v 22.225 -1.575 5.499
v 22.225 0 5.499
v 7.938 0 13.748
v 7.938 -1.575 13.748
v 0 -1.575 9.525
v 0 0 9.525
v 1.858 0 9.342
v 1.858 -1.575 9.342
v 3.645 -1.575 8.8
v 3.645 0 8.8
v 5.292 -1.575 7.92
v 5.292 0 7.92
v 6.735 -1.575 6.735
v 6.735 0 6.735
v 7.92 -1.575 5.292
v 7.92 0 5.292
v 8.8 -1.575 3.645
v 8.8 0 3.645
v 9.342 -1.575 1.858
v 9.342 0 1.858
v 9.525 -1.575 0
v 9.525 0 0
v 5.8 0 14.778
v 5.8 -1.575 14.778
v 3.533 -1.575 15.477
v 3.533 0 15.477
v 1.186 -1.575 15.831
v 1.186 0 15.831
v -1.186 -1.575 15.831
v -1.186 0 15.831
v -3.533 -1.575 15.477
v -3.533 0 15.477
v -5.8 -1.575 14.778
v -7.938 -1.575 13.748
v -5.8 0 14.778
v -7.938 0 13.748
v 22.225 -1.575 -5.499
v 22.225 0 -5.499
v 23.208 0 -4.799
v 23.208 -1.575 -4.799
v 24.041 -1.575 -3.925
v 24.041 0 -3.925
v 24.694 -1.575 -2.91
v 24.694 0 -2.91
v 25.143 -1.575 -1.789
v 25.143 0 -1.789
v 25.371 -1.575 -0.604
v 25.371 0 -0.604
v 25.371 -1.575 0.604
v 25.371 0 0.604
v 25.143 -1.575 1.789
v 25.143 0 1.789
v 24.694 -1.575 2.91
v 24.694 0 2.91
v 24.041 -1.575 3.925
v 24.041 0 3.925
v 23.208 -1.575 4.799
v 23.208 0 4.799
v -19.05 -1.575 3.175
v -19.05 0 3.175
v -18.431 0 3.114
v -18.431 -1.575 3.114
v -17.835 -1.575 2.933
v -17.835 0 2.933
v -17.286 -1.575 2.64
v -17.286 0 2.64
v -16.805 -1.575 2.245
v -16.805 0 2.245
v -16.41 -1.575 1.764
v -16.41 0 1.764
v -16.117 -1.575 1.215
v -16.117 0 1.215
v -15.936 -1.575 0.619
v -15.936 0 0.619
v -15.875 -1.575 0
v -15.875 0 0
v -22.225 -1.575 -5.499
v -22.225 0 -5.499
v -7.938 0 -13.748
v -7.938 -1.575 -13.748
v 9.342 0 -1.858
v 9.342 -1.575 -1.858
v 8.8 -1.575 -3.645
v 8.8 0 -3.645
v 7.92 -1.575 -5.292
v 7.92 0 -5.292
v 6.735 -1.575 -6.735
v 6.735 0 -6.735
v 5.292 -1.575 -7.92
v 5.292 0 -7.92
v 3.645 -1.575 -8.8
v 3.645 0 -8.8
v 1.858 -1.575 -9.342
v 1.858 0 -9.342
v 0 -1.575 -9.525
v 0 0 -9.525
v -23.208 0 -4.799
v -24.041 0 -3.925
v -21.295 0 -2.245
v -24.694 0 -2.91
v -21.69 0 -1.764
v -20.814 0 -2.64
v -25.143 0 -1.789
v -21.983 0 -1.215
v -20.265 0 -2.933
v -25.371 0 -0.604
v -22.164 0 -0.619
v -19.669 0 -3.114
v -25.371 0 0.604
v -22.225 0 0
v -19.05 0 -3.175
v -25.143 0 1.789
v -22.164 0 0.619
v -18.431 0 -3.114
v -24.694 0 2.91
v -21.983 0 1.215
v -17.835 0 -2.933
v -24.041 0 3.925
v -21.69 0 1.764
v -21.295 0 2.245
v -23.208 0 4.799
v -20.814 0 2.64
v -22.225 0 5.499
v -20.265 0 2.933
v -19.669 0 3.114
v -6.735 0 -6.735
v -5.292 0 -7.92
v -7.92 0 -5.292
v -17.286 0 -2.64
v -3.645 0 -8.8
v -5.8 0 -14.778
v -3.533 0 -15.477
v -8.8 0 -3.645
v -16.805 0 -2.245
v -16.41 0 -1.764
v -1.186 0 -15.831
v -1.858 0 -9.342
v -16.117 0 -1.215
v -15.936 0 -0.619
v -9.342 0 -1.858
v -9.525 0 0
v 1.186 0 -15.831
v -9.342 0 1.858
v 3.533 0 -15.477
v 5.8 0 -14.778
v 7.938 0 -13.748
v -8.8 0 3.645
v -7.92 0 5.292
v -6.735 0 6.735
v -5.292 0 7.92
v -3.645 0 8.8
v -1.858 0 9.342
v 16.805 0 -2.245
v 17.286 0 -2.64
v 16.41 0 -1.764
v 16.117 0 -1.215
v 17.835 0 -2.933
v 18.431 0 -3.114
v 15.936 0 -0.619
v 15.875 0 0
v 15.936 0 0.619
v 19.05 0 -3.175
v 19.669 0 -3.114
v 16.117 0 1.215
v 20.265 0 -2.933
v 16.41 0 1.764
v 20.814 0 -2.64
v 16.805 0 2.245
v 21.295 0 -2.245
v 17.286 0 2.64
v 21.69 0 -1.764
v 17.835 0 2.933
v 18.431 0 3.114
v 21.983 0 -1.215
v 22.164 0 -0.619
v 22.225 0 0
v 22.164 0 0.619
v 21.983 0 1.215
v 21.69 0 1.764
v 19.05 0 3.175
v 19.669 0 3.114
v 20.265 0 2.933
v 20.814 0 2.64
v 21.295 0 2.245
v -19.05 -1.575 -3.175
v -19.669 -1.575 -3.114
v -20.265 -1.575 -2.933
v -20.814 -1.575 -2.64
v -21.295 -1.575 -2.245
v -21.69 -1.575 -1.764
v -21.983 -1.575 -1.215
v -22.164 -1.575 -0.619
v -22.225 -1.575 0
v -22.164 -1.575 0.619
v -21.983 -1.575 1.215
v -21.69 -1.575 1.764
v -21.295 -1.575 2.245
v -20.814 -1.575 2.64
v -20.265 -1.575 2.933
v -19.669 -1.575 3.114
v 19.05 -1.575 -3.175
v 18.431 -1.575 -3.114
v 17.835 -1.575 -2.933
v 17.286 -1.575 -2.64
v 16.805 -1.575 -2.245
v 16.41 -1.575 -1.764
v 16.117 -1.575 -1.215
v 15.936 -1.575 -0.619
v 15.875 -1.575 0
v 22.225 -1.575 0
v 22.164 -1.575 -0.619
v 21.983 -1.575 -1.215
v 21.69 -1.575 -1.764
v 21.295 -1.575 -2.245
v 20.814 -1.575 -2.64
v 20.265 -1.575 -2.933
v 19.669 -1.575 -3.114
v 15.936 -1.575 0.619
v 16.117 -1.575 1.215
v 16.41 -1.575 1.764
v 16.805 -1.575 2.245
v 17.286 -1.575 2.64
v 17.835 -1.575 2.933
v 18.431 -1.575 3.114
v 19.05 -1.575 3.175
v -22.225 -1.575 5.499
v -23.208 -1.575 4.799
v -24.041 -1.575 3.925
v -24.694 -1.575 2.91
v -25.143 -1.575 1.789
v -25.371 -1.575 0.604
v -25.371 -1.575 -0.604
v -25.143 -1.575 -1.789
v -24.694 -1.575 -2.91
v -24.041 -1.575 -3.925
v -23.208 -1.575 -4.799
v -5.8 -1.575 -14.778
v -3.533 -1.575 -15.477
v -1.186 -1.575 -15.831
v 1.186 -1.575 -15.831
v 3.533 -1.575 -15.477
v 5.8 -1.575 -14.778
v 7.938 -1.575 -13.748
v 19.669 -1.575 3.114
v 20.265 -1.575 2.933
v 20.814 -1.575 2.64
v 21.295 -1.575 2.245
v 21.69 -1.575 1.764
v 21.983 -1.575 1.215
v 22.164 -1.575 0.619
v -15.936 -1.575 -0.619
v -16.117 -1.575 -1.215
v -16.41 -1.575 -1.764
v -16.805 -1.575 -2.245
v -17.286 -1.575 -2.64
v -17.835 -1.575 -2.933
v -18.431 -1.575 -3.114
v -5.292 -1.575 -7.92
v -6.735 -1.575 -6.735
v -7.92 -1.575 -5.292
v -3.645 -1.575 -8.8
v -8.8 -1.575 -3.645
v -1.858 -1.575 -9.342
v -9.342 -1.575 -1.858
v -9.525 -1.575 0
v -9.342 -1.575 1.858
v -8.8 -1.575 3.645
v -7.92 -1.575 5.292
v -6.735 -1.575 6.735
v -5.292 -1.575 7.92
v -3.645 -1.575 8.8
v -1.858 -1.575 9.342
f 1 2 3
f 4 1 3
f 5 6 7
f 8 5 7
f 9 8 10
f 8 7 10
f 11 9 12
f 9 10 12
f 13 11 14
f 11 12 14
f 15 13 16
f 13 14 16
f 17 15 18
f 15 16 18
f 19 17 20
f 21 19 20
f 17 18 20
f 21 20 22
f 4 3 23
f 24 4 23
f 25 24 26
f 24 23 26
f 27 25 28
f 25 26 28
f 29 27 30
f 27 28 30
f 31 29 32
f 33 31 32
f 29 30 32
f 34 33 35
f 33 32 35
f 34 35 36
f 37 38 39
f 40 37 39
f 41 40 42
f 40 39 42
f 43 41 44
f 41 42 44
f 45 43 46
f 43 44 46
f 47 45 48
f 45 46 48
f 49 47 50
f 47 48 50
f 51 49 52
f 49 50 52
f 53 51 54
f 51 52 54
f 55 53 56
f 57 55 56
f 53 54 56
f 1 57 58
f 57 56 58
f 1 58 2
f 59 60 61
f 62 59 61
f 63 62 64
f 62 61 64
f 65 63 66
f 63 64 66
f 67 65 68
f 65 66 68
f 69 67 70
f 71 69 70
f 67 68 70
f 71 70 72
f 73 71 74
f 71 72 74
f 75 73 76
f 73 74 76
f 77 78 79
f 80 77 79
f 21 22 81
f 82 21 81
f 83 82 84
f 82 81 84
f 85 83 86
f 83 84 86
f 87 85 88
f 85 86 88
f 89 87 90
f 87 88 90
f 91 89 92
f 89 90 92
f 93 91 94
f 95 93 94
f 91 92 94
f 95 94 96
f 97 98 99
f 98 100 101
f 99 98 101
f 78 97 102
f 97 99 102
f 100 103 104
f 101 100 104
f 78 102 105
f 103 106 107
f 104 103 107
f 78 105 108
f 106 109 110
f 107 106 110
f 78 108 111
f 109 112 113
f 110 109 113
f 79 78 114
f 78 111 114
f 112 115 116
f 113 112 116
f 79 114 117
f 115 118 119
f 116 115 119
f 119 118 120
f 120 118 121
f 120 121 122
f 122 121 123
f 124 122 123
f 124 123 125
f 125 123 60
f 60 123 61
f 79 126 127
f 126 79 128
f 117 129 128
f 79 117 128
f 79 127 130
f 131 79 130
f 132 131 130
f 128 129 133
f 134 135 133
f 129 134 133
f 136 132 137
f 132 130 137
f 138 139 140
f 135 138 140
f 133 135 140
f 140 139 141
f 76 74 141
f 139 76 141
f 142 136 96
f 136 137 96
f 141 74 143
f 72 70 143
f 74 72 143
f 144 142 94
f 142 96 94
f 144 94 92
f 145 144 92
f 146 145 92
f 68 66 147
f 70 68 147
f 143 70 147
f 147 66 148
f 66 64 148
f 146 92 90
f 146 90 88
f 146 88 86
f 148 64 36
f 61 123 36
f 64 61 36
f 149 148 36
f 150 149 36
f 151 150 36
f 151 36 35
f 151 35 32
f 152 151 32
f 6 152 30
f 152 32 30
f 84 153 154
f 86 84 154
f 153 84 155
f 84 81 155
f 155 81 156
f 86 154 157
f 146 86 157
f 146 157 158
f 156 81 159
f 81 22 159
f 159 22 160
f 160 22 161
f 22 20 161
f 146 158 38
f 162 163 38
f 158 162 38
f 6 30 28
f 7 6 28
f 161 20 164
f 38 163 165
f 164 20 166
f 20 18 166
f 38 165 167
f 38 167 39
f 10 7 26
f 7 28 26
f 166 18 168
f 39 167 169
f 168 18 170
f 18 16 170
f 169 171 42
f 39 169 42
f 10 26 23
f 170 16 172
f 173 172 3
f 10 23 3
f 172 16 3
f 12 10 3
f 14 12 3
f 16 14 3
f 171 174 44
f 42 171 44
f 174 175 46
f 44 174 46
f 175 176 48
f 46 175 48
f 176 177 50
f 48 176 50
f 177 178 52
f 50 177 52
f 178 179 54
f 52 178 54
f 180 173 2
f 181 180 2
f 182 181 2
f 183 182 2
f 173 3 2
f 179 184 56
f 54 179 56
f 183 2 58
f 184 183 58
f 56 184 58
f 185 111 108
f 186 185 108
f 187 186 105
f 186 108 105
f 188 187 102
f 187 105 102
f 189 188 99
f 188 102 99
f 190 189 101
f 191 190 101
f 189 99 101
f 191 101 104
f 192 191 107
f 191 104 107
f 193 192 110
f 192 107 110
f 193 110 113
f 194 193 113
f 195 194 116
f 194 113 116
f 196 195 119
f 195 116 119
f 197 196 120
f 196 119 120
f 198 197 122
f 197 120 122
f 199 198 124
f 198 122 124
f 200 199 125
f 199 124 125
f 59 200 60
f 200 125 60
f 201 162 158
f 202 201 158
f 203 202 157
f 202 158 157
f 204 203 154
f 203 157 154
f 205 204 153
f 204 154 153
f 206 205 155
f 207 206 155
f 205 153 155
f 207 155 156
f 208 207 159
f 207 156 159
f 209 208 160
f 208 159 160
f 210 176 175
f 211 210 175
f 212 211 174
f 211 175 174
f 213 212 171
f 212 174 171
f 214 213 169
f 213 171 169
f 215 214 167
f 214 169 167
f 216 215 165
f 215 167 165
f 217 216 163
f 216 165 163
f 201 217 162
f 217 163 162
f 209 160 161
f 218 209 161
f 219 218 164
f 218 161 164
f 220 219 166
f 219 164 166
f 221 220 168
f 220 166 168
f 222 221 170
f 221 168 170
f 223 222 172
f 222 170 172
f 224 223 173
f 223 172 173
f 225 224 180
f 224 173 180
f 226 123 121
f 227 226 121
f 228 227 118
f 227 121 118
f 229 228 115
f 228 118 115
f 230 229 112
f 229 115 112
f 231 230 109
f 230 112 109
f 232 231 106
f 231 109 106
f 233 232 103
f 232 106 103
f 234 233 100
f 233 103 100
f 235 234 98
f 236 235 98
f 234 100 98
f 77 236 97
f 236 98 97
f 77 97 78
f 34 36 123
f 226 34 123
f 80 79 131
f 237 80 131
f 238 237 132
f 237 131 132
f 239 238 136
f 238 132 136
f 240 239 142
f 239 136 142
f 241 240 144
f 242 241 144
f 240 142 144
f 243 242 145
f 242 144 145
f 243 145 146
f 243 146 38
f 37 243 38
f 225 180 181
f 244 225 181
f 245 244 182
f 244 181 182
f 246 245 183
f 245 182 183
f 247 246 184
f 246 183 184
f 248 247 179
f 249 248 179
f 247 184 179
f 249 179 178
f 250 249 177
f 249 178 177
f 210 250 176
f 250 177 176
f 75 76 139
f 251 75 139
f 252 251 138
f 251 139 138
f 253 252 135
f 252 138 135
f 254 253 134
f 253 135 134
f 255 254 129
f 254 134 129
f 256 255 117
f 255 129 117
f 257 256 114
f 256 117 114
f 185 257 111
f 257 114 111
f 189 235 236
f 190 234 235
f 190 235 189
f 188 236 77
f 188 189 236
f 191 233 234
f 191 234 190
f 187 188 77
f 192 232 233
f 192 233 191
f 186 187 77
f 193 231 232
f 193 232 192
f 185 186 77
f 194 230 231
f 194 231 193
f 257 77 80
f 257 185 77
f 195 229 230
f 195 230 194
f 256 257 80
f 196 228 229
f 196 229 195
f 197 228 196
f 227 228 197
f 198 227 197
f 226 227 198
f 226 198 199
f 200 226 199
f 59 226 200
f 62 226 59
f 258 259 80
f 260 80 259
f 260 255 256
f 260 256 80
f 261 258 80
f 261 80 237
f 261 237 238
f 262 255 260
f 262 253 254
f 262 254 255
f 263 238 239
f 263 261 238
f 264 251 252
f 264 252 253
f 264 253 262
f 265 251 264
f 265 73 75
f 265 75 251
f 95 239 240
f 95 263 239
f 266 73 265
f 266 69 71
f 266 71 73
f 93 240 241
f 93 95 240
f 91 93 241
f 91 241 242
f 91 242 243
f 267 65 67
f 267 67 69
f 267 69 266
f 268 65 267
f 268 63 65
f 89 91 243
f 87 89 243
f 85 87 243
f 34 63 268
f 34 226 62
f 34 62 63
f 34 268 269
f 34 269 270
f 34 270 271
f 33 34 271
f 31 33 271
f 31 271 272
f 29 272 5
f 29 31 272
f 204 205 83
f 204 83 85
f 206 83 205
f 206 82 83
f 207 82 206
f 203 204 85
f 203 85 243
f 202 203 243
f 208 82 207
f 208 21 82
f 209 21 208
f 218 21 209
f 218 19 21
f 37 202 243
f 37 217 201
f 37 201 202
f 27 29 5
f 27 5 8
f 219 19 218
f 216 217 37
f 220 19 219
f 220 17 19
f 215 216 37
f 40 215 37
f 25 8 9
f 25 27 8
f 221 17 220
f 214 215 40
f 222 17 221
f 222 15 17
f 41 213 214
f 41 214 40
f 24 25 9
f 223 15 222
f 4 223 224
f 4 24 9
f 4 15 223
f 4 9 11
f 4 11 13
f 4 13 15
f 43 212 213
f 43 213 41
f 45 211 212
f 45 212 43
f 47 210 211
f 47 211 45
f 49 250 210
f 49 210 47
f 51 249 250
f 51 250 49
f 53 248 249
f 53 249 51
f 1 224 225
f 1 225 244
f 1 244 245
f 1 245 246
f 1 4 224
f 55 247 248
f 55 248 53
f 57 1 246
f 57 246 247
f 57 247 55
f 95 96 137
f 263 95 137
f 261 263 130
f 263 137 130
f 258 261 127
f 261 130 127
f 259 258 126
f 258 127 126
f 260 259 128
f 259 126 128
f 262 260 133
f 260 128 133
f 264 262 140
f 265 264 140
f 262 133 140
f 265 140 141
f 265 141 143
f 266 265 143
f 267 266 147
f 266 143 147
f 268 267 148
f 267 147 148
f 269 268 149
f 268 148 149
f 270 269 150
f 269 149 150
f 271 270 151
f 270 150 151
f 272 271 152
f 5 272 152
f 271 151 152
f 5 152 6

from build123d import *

# Parameters (mm, degrees)
F1_DEPTH = 1.5748


with BuildPart() as f1:
    # F0 (on Front) → F1 (new body)
    with BuildSketch(Plane.XZ):
        with BuildLine():
            Line((-7.9375, 13.748153), (-22.225, 5.499261))
            ThreePointArc((-22.225, 5.499261), (-25.4, 0), (-22.225, -5.499261))
            Line((-22.225, -5.499261), (-7.9375, -13.748153))
            ThreePointArc((-7.9375, -13.748153), (0, -15.875), (7.9375, -13.748153))
            Line((7.9375, -13.748153), (22.225, -5.499261))
            ThreePointArc((22.225, -5.499261), (25.4, 0), (22.225, 5.499261))
            Line((22.225, 5.499261), (7.9375, 13.748153))
            ThreePointArc((7.9375, 13.748153), (0, 15.875), (-7.9375, 13.748153))
        make_face()
        with BuildLine():
            ThreePointArc((-19.05, 3.175), (-16.804936, 2.245064), (-15.875, 0))
            ThreePointArc((-15.875, 0), (-16.804936, -2.245064), (-19.05, -3.175))
            ThreePointArc((-19.05, -3.175), (-21.295064, -2.245064), (-22.225, 0))
            ThreePointArc((-22.225, 0), (-21.295064, 2.245064), (-19.05, 3.175))
        make_face(mode=Mode.SUBTRACT)
        with BuildLine():
            ThreePointArc((0, 9.525), (6.735192, 6.735192), (9.525, 0))
            ThreePointArc((9.525, 0), (6.735192, -6.735192), (0, -9.525))
            ThreePointArc((0, -9.525), (-6.735192, -6.735192), (-9.525, 0))
            ThreePointArc((-9.525, 0), (-6.735192, 6.735192), (0, 9.525))
        make_face(mode=Mode.SUBTRACT)
        with BuildLine():
            ThreePointArc((19.05, 3.175), (21.295064, 2.245064), (22.225, 0))
            ThreePointArc((22.225, 0), (21.295064, -2.245064), (19.05, -3.175))
            ThreePointArc((19.05, -3.175), (16.804936, -2.245064), (15.875, 0))
            ThreePointArc((15.875, 0), (16.804936, 2.245064), (19.05, 3.175))
        make_face(mode=Mode.SUBTRACT)
    extrude(amount=F1_DEPTH)


solid = f1.part
